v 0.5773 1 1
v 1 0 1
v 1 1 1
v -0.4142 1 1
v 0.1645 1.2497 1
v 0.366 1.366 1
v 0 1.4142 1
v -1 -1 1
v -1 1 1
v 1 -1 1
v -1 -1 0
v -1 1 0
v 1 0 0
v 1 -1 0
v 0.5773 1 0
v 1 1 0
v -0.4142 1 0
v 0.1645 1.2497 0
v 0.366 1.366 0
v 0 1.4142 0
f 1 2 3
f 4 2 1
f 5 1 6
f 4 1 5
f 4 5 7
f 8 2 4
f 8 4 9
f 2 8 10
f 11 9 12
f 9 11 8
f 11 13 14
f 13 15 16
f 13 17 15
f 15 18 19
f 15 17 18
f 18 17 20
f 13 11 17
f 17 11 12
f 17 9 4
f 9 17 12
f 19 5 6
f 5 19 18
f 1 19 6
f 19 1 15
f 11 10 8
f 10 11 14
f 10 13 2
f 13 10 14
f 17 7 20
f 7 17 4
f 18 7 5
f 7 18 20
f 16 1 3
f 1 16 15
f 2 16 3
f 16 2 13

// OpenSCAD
rotate(90) cube();
rotate(30) cube();
rotate(-90) cube();
rotate(45) cube();
rotate(1e-9) cube();
rotate(a = 180) cube();
